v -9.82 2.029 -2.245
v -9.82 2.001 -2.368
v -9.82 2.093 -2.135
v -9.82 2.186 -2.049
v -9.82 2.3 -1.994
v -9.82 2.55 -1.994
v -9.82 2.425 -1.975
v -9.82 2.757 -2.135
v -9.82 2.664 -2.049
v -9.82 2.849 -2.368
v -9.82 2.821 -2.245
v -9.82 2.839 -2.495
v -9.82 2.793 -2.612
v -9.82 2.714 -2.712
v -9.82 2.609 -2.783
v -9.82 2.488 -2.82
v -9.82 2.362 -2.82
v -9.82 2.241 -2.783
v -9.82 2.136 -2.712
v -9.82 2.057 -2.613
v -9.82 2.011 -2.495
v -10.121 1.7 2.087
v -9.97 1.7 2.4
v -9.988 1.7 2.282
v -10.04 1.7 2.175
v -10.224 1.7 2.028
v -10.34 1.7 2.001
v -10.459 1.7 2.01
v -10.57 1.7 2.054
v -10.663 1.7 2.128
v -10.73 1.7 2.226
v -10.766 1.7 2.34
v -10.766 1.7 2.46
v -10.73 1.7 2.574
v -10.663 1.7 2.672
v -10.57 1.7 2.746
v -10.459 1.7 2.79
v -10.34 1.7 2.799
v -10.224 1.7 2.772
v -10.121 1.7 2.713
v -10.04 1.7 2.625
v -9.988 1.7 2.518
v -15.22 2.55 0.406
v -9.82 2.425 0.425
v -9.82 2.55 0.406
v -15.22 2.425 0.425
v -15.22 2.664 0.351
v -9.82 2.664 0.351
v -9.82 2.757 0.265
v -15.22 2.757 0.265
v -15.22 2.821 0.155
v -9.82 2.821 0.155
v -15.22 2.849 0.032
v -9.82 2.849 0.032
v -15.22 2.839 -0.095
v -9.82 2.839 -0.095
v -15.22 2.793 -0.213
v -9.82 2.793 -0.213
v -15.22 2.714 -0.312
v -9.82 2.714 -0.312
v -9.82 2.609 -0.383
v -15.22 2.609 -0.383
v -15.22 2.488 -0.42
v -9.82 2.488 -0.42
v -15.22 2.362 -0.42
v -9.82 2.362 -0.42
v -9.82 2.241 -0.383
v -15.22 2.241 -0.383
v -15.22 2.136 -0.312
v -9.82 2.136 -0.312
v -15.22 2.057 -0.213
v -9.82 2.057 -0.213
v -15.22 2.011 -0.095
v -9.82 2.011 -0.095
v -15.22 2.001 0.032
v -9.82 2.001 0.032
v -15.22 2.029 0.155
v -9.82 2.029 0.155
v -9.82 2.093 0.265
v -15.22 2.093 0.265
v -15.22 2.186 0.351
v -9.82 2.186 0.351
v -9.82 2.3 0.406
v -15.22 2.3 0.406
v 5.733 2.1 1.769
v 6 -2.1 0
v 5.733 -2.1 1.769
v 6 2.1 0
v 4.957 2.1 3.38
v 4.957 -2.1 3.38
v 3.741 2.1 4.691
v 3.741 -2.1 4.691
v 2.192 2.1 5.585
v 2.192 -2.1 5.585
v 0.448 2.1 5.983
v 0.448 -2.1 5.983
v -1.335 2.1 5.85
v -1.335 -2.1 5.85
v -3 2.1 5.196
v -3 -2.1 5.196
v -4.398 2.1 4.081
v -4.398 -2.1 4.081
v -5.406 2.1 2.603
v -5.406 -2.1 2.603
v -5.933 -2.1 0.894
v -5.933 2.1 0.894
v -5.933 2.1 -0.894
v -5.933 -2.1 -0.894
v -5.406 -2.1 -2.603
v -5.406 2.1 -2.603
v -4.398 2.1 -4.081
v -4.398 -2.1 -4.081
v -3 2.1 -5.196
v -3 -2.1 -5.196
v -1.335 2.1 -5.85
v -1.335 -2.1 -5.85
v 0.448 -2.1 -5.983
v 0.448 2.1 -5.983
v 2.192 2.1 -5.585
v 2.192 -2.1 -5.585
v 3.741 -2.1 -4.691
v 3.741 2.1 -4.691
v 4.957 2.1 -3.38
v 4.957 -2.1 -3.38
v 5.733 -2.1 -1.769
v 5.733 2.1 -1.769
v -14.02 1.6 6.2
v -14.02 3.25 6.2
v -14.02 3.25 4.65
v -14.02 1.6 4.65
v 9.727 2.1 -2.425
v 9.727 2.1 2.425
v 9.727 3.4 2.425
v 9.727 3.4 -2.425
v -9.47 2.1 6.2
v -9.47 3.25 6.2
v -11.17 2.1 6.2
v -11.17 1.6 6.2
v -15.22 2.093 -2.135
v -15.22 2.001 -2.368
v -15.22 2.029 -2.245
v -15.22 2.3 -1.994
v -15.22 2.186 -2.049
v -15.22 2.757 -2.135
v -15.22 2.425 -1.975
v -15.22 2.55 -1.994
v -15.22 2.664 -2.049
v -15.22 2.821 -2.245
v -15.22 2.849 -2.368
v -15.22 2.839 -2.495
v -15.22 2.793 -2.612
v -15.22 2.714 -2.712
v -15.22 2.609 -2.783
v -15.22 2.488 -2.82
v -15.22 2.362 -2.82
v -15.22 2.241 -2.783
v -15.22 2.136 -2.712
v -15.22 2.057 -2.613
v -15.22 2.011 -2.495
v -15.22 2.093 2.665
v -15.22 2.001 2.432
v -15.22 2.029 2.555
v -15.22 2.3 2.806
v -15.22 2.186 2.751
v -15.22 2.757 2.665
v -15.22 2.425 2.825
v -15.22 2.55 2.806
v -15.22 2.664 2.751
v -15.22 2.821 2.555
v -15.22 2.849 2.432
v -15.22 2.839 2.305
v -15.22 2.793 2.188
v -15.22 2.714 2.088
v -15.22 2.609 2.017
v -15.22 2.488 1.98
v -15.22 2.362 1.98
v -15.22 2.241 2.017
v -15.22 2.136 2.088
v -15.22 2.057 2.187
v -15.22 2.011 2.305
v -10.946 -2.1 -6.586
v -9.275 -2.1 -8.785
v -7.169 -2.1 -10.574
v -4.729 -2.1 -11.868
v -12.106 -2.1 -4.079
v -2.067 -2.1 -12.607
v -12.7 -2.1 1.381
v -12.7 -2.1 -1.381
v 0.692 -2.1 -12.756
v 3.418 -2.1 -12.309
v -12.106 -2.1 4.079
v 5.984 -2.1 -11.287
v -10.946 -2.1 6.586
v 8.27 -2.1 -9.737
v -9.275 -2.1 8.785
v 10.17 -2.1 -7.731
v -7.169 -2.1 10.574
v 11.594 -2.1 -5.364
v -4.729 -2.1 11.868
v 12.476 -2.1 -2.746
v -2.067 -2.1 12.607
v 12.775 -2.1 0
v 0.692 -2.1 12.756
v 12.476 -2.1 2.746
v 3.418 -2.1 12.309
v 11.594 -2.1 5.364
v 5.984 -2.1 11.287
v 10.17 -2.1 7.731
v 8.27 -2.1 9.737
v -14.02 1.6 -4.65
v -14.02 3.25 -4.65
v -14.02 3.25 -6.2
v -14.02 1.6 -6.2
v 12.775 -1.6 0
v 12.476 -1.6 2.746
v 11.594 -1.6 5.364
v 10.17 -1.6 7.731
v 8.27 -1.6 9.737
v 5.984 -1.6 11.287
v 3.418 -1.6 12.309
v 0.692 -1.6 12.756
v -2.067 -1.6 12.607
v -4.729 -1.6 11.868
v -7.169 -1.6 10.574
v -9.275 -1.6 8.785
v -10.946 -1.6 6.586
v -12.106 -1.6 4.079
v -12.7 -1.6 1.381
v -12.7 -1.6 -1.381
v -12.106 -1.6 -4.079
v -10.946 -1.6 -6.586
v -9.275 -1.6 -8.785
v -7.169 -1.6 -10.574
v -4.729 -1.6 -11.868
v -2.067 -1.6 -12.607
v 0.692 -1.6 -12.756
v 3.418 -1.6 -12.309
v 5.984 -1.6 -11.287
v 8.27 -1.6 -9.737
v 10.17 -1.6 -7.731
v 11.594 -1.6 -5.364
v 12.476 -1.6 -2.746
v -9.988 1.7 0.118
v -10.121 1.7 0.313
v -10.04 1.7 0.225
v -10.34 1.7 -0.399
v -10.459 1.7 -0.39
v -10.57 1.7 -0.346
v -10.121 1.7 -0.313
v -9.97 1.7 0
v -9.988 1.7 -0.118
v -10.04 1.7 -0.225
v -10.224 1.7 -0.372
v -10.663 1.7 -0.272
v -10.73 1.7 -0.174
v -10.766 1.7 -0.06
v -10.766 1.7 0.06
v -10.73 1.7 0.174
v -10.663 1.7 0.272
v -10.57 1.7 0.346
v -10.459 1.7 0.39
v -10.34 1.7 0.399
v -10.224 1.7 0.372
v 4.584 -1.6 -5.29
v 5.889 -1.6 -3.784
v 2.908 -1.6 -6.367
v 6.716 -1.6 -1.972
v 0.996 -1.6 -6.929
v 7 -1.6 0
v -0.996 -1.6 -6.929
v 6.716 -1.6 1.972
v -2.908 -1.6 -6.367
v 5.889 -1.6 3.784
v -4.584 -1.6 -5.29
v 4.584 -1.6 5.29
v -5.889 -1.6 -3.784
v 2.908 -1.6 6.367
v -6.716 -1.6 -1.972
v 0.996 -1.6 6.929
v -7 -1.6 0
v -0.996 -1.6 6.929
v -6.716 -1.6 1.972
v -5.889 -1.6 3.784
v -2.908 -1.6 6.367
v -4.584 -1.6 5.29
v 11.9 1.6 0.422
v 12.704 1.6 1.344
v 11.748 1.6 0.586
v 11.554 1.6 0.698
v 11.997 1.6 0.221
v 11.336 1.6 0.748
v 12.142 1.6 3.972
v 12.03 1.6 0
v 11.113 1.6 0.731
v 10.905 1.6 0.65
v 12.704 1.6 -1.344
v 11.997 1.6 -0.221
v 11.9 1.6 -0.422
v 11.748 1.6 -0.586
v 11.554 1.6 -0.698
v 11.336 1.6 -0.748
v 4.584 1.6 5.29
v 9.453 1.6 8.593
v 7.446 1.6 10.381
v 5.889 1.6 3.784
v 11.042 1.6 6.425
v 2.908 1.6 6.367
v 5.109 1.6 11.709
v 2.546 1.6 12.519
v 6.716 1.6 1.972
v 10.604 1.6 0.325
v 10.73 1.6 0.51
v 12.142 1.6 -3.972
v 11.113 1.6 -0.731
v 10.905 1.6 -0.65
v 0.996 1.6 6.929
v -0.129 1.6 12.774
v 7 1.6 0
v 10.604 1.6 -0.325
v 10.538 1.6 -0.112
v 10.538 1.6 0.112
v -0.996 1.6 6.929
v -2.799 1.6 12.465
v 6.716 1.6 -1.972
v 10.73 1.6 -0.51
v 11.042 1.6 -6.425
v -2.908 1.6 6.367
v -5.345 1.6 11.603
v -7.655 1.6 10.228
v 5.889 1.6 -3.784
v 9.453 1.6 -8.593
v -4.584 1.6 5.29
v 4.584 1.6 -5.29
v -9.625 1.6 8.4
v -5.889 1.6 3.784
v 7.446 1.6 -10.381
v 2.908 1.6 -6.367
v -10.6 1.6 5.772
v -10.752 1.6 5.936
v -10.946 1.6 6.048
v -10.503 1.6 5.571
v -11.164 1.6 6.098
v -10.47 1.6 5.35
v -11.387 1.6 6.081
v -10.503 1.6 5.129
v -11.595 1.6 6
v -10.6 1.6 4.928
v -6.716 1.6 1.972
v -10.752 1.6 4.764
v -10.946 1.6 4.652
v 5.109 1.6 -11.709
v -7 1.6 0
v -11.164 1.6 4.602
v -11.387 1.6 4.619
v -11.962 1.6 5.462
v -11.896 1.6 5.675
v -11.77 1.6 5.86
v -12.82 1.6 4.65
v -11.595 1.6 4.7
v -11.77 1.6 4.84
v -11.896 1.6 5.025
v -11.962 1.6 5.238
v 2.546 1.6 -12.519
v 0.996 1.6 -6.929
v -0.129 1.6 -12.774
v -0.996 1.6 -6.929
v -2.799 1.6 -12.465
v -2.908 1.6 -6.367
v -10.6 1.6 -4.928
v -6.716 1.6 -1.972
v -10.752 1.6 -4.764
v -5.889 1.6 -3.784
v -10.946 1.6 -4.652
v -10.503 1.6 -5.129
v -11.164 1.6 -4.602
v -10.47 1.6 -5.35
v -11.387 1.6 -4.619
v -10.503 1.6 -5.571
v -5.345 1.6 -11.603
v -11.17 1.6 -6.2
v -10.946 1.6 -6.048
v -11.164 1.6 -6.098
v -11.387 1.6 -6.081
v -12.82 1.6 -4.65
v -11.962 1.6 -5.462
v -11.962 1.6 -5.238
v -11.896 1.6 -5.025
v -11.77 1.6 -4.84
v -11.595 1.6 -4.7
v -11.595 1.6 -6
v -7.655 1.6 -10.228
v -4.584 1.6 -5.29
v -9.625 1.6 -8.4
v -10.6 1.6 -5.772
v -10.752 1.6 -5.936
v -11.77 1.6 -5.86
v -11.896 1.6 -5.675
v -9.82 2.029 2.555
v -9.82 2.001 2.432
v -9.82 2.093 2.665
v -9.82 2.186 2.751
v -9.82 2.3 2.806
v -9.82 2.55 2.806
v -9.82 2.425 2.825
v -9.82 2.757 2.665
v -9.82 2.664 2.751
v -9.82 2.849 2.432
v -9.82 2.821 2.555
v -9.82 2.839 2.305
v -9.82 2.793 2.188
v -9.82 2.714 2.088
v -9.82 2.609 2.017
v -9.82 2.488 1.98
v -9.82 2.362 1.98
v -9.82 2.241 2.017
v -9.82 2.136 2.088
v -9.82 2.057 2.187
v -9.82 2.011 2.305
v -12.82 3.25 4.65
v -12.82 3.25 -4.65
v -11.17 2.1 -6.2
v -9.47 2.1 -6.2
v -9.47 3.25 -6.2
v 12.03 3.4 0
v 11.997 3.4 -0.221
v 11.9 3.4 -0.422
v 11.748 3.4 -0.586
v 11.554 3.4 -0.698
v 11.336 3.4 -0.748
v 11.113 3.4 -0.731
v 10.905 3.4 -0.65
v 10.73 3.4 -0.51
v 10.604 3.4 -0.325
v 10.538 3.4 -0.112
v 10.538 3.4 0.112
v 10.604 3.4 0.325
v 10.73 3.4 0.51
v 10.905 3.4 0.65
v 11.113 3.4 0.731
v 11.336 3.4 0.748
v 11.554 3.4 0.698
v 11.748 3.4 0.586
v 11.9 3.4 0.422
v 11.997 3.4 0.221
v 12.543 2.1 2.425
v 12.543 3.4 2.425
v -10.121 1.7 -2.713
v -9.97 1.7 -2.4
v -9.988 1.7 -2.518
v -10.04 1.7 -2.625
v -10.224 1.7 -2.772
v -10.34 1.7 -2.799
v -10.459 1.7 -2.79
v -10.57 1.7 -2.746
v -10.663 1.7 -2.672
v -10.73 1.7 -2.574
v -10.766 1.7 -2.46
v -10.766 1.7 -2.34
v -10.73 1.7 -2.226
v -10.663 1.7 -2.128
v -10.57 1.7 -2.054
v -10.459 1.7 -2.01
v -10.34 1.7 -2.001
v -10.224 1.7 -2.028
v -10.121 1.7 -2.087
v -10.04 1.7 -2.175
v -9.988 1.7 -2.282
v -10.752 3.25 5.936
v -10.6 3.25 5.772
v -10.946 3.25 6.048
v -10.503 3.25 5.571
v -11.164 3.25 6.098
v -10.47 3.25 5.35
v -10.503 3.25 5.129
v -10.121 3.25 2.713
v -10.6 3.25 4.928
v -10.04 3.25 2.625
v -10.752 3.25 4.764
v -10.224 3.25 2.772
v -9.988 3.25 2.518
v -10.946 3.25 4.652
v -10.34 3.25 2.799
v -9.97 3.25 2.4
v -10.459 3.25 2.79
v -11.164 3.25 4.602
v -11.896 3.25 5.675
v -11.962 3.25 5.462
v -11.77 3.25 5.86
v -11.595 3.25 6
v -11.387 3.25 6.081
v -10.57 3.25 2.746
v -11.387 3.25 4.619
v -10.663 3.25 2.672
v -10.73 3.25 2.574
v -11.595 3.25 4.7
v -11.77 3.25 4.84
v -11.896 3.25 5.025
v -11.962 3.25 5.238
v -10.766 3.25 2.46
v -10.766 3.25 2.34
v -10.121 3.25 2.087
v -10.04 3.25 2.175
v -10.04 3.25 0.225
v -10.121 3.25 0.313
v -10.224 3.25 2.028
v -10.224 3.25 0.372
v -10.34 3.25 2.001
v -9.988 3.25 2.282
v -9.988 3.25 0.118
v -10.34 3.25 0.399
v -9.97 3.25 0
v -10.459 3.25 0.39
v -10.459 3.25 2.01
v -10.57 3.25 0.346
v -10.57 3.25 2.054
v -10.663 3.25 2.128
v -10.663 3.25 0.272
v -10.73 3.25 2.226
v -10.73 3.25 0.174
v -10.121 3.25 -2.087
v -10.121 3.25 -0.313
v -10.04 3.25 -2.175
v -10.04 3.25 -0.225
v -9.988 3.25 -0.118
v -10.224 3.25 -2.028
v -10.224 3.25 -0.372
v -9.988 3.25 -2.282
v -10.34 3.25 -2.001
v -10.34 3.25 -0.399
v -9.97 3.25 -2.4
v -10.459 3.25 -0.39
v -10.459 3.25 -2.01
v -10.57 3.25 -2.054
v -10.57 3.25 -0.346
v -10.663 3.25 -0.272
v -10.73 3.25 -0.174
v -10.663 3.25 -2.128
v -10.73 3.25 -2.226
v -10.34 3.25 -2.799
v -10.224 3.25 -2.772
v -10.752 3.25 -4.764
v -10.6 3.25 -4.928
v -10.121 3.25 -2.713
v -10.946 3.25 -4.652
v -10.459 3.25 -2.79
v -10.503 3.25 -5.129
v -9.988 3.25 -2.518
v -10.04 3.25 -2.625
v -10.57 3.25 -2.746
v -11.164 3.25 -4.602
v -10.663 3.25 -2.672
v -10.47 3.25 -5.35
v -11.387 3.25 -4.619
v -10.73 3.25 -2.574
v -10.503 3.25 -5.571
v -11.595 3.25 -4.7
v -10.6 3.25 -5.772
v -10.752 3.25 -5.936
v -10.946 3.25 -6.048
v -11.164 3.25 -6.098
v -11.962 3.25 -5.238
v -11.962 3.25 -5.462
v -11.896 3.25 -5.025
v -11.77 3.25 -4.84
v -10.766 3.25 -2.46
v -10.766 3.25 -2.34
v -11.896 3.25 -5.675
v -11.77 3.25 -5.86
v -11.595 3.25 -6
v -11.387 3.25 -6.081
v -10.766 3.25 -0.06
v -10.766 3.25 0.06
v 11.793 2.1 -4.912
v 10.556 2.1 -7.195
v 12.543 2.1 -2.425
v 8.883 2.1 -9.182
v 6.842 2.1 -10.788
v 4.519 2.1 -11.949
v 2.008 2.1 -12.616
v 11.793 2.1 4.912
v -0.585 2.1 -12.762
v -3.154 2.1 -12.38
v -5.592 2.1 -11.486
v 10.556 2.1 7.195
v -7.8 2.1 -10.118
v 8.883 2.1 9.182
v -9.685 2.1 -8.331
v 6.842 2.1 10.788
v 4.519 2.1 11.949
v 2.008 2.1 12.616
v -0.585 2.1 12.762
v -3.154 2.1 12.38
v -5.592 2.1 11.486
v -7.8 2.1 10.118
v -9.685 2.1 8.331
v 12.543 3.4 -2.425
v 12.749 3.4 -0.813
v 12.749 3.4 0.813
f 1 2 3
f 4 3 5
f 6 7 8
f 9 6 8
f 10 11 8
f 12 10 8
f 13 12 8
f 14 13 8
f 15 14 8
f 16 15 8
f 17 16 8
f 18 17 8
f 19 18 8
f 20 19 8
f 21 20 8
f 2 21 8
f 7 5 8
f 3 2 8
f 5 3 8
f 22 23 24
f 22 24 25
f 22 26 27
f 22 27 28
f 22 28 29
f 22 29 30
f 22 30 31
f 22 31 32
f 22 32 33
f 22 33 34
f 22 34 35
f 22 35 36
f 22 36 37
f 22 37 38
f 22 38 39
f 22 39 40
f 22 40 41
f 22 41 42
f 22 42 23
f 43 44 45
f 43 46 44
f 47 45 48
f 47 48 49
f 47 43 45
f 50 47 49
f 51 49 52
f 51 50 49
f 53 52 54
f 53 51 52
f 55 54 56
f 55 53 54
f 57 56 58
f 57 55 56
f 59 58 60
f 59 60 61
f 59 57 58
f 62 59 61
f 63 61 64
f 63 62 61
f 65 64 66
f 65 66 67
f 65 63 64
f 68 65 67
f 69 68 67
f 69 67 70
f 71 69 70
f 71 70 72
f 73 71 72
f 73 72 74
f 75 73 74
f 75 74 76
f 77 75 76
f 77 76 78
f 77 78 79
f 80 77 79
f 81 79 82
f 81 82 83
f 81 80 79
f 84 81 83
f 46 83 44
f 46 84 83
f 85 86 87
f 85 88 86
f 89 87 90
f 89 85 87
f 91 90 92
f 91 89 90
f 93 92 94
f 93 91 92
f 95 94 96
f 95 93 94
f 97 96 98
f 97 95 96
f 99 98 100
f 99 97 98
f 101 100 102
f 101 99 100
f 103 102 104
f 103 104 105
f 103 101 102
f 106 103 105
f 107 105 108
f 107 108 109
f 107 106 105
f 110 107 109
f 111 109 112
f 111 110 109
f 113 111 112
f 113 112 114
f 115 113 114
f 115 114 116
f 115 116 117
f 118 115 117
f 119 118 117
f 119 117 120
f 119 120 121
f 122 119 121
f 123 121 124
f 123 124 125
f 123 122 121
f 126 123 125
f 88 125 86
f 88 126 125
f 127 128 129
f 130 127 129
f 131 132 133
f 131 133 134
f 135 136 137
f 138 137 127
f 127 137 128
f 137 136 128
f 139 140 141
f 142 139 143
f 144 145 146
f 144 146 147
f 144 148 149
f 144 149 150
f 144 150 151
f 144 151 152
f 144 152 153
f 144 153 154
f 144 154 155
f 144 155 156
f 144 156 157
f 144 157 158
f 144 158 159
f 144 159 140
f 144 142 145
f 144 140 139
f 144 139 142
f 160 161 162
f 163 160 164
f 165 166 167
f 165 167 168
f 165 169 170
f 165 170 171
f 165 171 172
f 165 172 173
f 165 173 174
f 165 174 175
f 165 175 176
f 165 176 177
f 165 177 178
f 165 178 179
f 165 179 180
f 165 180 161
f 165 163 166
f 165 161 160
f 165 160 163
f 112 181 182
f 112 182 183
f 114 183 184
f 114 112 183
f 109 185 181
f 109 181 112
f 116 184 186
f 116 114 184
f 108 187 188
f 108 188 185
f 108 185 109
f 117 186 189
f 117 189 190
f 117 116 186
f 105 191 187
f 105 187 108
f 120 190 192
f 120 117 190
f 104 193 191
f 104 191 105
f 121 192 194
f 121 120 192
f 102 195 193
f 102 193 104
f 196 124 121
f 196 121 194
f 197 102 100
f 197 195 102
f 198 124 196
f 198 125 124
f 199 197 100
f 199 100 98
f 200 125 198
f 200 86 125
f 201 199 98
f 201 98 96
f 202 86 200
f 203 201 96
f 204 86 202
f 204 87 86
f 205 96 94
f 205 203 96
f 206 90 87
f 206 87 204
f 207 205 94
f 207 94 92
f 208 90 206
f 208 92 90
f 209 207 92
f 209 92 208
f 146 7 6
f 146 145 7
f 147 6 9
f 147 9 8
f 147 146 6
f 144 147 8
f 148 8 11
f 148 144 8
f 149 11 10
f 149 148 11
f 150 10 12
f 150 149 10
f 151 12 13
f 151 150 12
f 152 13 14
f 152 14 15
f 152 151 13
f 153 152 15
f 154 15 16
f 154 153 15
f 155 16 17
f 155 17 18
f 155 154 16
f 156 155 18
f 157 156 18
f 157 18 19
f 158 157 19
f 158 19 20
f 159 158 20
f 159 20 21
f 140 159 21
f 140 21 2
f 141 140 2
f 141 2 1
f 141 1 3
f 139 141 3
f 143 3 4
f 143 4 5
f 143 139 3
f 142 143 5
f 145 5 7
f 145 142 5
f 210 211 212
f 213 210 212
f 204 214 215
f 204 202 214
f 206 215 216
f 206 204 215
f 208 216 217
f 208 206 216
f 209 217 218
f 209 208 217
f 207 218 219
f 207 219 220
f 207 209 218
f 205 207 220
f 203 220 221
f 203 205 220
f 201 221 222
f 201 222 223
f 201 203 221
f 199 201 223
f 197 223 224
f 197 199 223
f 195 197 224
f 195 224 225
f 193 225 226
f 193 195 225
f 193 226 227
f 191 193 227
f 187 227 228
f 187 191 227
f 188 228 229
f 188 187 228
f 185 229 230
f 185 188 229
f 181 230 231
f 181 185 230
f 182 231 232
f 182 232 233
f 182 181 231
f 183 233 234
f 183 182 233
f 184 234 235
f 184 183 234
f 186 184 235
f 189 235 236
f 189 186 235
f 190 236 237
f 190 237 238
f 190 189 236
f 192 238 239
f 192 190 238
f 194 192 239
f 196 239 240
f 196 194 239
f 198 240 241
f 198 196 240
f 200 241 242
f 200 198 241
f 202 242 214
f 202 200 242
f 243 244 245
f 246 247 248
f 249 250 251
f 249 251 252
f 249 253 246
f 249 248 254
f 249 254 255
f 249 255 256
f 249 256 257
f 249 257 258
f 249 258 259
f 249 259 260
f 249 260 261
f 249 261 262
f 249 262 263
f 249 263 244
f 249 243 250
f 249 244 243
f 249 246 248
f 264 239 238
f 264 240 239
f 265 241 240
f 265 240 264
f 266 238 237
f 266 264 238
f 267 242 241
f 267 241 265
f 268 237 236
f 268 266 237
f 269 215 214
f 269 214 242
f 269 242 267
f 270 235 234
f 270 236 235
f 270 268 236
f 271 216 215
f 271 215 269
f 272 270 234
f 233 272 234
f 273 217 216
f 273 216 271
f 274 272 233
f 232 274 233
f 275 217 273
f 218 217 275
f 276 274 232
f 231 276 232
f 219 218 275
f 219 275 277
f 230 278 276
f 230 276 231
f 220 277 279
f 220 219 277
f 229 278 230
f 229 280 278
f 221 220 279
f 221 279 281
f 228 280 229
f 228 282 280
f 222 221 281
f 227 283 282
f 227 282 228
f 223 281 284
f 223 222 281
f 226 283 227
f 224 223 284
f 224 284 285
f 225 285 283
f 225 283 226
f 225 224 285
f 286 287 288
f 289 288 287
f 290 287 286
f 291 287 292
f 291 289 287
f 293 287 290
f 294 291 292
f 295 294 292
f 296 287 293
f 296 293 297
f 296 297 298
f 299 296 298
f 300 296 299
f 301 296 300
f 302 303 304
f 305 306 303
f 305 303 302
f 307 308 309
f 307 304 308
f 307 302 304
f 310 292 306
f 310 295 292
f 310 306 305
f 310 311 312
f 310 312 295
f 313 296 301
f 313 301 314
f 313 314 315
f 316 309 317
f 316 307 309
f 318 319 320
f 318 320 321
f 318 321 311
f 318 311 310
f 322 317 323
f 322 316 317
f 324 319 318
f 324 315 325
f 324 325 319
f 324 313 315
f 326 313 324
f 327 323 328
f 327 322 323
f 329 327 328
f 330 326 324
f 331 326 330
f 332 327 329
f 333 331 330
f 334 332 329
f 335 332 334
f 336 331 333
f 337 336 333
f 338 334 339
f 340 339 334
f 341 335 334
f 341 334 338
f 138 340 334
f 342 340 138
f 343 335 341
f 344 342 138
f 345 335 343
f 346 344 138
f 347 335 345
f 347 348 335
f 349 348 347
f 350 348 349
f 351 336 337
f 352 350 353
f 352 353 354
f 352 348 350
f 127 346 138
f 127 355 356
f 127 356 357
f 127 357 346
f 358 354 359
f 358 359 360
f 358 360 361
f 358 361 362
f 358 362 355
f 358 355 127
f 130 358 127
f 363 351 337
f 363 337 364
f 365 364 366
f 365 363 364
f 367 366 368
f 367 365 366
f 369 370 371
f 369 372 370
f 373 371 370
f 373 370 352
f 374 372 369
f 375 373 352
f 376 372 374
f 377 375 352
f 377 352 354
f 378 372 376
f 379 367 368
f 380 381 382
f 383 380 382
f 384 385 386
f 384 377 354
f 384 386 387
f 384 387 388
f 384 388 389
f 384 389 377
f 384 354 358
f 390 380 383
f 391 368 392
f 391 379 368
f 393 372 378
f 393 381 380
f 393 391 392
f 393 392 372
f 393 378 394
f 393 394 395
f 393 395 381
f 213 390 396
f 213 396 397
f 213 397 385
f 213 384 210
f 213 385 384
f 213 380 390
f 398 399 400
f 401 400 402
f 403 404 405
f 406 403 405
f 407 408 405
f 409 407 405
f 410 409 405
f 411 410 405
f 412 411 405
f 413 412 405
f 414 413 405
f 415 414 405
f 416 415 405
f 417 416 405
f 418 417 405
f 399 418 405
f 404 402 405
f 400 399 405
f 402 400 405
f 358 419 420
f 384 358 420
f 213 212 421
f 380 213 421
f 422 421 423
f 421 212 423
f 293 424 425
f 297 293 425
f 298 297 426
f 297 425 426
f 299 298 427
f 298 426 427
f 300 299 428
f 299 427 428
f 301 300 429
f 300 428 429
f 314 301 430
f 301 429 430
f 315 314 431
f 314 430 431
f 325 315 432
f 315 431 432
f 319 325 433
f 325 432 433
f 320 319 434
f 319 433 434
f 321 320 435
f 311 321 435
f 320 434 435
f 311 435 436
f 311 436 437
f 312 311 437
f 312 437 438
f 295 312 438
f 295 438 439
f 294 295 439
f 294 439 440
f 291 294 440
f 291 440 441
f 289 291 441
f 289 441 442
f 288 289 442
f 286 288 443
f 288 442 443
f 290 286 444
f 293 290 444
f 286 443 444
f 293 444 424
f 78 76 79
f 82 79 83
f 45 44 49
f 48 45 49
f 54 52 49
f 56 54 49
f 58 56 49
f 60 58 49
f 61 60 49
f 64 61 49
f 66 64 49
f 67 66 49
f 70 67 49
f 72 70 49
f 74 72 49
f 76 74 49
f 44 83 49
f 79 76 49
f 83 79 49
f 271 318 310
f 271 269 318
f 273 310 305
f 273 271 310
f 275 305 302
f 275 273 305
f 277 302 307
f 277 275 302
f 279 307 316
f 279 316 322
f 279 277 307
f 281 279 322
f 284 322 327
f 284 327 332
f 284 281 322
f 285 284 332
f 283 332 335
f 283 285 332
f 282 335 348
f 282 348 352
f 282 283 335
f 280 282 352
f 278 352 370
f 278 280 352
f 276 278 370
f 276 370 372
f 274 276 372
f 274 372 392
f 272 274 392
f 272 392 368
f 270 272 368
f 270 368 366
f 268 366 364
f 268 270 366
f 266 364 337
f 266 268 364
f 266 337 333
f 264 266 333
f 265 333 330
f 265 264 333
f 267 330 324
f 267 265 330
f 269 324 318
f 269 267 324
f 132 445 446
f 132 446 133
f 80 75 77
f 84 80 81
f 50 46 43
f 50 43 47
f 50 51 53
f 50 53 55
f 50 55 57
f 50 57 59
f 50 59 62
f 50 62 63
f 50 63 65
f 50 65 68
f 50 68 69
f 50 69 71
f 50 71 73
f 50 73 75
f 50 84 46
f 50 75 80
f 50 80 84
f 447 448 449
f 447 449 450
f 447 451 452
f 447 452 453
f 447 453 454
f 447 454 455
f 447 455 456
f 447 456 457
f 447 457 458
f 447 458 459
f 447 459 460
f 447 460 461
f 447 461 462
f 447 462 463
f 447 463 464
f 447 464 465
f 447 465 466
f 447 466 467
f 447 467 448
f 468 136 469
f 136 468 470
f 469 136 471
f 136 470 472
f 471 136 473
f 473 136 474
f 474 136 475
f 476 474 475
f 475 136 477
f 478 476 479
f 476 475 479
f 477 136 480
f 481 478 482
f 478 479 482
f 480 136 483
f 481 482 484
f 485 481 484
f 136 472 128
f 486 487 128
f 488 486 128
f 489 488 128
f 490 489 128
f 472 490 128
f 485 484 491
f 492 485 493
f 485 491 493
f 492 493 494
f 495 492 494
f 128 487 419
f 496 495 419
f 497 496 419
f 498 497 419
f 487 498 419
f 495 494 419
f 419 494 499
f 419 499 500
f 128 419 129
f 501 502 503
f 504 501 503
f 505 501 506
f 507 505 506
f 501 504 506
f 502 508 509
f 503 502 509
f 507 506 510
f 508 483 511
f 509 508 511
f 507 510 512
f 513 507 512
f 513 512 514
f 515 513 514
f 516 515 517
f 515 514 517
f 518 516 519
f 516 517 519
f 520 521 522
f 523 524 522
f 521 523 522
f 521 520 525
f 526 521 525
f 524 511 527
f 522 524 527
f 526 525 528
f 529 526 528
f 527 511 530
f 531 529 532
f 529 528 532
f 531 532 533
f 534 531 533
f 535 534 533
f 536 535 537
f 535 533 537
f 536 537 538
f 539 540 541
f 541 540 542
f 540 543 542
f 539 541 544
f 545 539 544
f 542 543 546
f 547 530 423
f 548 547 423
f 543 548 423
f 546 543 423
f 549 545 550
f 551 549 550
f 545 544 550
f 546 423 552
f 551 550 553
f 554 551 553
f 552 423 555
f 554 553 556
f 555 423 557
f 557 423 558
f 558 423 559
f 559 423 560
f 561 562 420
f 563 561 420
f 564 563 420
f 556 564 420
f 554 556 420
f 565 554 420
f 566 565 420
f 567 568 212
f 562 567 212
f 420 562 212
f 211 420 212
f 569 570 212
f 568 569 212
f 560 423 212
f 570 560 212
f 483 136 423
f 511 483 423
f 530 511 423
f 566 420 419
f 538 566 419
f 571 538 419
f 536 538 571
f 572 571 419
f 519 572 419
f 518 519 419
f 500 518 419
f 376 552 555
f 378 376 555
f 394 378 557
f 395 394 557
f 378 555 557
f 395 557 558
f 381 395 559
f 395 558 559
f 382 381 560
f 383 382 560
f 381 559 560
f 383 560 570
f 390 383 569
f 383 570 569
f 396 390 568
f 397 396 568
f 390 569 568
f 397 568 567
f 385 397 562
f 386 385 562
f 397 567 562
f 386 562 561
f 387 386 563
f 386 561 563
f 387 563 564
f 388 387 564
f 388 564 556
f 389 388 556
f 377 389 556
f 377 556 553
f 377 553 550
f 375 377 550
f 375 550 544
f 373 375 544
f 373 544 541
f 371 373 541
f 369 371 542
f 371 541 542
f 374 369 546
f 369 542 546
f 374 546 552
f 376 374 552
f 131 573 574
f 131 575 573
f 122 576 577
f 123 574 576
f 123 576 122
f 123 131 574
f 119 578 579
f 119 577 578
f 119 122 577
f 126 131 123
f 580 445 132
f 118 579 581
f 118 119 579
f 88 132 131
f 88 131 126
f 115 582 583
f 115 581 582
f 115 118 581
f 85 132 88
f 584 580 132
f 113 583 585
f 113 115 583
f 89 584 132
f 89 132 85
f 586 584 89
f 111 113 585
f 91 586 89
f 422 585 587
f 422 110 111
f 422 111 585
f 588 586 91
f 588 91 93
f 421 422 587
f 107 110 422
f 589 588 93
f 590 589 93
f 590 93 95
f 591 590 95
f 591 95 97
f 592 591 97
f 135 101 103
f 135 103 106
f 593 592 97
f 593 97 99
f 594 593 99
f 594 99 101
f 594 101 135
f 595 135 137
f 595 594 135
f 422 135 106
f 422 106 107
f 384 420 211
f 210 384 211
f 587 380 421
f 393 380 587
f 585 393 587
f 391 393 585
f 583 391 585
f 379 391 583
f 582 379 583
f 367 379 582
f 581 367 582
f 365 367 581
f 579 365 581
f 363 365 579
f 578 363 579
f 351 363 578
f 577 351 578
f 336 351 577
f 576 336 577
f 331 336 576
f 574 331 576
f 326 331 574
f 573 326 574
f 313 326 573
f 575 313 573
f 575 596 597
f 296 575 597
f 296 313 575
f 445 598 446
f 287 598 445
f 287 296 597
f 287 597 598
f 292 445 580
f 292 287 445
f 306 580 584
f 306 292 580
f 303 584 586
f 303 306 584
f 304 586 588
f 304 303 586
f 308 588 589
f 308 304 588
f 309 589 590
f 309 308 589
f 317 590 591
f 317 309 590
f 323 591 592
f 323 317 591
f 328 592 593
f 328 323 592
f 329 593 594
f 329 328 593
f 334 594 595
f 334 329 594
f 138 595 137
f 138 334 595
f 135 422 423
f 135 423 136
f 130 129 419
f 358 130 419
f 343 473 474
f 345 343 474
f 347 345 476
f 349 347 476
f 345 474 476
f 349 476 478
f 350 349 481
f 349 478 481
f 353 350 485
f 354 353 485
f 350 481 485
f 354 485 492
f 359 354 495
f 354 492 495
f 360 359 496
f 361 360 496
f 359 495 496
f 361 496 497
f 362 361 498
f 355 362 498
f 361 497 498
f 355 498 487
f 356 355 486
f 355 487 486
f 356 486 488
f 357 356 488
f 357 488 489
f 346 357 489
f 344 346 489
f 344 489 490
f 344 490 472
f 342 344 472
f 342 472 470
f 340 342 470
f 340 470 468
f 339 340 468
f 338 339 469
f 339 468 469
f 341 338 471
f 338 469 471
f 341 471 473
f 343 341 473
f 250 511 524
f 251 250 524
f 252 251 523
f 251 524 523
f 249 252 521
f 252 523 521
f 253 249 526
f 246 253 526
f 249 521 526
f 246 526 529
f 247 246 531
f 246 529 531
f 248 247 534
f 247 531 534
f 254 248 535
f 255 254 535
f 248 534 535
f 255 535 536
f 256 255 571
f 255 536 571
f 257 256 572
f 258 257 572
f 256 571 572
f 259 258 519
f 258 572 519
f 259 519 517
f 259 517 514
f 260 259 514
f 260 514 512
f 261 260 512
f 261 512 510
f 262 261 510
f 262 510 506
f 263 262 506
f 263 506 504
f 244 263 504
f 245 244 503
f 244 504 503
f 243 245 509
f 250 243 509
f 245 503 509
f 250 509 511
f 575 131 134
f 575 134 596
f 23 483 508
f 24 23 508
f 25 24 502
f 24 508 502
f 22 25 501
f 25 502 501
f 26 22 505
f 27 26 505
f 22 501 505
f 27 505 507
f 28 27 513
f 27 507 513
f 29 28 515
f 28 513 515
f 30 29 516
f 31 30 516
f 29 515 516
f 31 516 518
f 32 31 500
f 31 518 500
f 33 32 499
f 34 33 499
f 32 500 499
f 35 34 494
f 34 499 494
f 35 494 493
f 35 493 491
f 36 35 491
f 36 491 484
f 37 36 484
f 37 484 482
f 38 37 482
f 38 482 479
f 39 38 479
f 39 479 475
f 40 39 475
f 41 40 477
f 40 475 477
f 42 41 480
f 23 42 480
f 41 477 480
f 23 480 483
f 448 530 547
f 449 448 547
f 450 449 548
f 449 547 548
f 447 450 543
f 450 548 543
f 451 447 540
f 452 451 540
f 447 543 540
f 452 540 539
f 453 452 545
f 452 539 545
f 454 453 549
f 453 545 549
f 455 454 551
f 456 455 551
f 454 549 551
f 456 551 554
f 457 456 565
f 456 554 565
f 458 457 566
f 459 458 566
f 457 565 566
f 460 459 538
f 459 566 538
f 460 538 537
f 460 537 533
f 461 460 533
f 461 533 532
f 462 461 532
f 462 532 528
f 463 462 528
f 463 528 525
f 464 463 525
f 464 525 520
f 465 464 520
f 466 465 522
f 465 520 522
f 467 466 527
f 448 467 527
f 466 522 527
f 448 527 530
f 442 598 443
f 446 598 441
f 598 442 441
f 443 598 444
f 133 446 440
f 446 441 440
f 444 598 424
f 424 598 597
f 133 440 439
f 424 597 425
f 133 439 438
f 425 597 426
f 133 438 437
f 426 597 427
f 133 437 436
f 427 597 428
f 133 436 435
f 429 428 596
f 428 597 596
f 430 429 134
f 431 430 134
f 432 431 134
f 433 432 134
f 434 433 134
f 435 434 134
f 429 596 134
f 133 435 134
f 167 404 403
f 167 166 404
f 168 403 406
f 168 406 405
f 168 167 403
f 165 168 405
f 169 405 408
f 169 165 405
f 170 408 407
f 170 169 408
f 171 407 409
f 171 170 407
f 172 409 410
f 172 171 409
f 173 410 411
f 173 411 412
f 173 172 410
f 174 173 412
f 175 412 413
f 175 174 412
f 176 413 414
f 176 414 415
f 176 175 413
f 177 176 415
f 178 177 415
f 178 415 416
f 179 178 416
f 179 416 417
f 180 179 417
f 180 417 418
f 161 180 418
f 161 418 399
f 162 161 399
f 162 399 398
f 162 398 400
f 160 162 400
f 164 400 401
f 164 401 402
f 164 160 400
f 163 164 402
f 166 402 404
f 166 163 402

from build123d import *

# Parameters (mm, degrees)
EXTRUDE_1_DEPTH        = 1.3
EXTRUDE_2_DEPTH        = 1.15
EXTRUDE_2_DEPTH_BACK   = 0.5
SKETCH_4_R             = 0.75
CUT_EXTRUDE_1_DEPTH    = 1.65
SKETCH_5_R             = 0.4
CUT_EXTRUDE_2_DEPTH    = 1.55
SKETCH_6_R             = 0.425
EXTRUDE_3_DEPTH        = 2.4
EXTRUDE_3_DEPTH_BACK   = 3
EXTRUDE_3_2_DEPTH      = 2.4
EXTRUDE_3_2_DEPTH_BACK = 3
EXTRUDE_3_3_DEPTH      = 2.4
EXTRUDE_3_3_DEPTH_BACK = 3
SKETCH_7_R             = 0.75
CUT_EXTRUDE_3_DEPTH    = 1.8


with BuildPart() as part:
    # Эскиз1 → Повернуть1 (revolve)
    with BuildSketch(Plane.XY):
        Polygon((7, 1.6), (7, -1.6), (12.775, -1.6), (12.775, -2.1), (6, -2.1), (6, 2.1), (12.775, 2.1), (12.775, 1.6), align=None)
    revolve(axis=Axis((0, 2.1, 0), (0, -1, 0)))

    # Эскиз2 → Бобышка-Вытянуть1 (add)
    with BuildSketch(Plane(origin=(0, 2.1, 0), x_dir=(1, 0, 0), z_dir=(0, 1, 0))):
        with BuildLine():
            Line((9.727281223, 2.425), (12.542726976, 2.425))
            ThreePointArc((12.542726976, 2.425), (12.775, 0), (12.542726976, -2.425))
            Line((12.542726976, -2.425), (9.727281223, -2.425))
            Line((9.727281223, -2.425), (9.727281223, 2.425))
        make_face()
    extrude(amount=EXTRUDE_1_DEPTH)

    # Эскиз3 → Бобышка-Вытянуть2 (add, two sides)
    with BuildSketch(Plane(origin=(0, 2.1, 0), x_dir=(1, 0, 0), z_dir=(0, 1, 0))) as extrude_2_sk:
        Polygon((-14.02, 6.2), (-9.47, 6.2), (-9.47, -6.2), (-14.02, -6.2), (-14.02, -4.65), (-12.82, -4.65), (-12.82, 4.65), (-14.02, 4.65), align=None)
    extrude(amount=EXTRUDE_2_DEPTH)
    extrude(extrude_2_sk.sketch, amount=-EXTRUDE_2_DEPTH_BACK)

    # Эскиз4 → Вырез-Вытянуть1 (cut)
    with BuildSketch(Plane(origin=(0, 3.25, 0), x_dir=(1, 0, 0), z_dir=(0, 1, 0))):
        with Locations((-11.22, 5.35)):
            Circle(SKETCH_4_R)
        with Locations((-11.22, -5.35)):
            Circle(SKETCH_4_R)
    extrude(amount=-CUT_EXTRUDE_1_DEPTH, mode=Mode.SUBTRACT)

    # Эскиз5 → Вырез-Вытянуть2 (cut)
    with BuildSketch(Plane(origin=(0, 3.25, 0), x_dir=(1, 0, 0), z_dir=(0, 1, 0))):
        with Locations((-10.37, 2.4)):
            Circle(SKETCH_5_R)
        with Locations((-10.37, 0)):
            Circle(SKETCH_5_R)
        with Locations((-10.37, -2.4)):
            Circle(SKETCH_5_R)
    extrude(amount=-CUT_EXTRUDE_2_DEPTH, mode=Mode.SUBTRACT)

    # Эскиз7 → Вырез-Вытянуть3 (cut)
    with BuildSketch(Plane(origin=(0, 3.4, 0), x_dir=(1, 0, 0), z_dir=(0, 1, 0))):
        with Locations((11.28, 0)):
            Circle(SKETCH_7_R)
    extrude(amount=-CUT_EXTRUDE_3_DEPTH, mode=Mode.SUBTRACT)


with BuildPart() as body_2:
    # Эскиз6 → Бобышка-Вытянуть3 (new body, two sides)
    with BuildSketch(Plane.ZY.offset(12.82)) as extrude_3_sk:
        with Locations((0, 2.425)):
            Circle(SKETCH_6_R)
    extrude(amount=EXTRUDE_3_DEPTH)
    extrude(extrude_3_sk.sketch, amount=-EXTRUDE_3_DEPTH_BACK)


with BuildPart() as body_3:
    # Эскиз6 → Extrude 3 2 (new body, two sides)
    with BuildSketch(Plane.ZY.offset(12.82)) as extrude_3_2_sk:
        with Locations((2.4, 2.425)):
            Circle(SKETCH_6_R)
    extrude(amount=EXTRUDE_3_2_DEPTH)
    extrude(extrude_3_2_sk.sketch, amount=-EXTRUDE_3_2_DEPTH_BACK)


with BuildPart() as body_4:
    # Эскиз6 → Extrude 3 3 (new body, two sides)
    with BuildSketch(Plane.ZY.offset(12.82)) as extrude_3_3_sk:
        with Locations((-2.4, 2.425)):
            Circle(SKETCH_6_R)
    extrude(amount=EXTRUDE_3_3_DEPTH)
    extrude(extrude_3_3_sk.sketch, amount=-EXTRUDE_3_3_DEPTH_BACK)


solid = Compound([part.part, body_2.part, body_3.part, body_4.part])
